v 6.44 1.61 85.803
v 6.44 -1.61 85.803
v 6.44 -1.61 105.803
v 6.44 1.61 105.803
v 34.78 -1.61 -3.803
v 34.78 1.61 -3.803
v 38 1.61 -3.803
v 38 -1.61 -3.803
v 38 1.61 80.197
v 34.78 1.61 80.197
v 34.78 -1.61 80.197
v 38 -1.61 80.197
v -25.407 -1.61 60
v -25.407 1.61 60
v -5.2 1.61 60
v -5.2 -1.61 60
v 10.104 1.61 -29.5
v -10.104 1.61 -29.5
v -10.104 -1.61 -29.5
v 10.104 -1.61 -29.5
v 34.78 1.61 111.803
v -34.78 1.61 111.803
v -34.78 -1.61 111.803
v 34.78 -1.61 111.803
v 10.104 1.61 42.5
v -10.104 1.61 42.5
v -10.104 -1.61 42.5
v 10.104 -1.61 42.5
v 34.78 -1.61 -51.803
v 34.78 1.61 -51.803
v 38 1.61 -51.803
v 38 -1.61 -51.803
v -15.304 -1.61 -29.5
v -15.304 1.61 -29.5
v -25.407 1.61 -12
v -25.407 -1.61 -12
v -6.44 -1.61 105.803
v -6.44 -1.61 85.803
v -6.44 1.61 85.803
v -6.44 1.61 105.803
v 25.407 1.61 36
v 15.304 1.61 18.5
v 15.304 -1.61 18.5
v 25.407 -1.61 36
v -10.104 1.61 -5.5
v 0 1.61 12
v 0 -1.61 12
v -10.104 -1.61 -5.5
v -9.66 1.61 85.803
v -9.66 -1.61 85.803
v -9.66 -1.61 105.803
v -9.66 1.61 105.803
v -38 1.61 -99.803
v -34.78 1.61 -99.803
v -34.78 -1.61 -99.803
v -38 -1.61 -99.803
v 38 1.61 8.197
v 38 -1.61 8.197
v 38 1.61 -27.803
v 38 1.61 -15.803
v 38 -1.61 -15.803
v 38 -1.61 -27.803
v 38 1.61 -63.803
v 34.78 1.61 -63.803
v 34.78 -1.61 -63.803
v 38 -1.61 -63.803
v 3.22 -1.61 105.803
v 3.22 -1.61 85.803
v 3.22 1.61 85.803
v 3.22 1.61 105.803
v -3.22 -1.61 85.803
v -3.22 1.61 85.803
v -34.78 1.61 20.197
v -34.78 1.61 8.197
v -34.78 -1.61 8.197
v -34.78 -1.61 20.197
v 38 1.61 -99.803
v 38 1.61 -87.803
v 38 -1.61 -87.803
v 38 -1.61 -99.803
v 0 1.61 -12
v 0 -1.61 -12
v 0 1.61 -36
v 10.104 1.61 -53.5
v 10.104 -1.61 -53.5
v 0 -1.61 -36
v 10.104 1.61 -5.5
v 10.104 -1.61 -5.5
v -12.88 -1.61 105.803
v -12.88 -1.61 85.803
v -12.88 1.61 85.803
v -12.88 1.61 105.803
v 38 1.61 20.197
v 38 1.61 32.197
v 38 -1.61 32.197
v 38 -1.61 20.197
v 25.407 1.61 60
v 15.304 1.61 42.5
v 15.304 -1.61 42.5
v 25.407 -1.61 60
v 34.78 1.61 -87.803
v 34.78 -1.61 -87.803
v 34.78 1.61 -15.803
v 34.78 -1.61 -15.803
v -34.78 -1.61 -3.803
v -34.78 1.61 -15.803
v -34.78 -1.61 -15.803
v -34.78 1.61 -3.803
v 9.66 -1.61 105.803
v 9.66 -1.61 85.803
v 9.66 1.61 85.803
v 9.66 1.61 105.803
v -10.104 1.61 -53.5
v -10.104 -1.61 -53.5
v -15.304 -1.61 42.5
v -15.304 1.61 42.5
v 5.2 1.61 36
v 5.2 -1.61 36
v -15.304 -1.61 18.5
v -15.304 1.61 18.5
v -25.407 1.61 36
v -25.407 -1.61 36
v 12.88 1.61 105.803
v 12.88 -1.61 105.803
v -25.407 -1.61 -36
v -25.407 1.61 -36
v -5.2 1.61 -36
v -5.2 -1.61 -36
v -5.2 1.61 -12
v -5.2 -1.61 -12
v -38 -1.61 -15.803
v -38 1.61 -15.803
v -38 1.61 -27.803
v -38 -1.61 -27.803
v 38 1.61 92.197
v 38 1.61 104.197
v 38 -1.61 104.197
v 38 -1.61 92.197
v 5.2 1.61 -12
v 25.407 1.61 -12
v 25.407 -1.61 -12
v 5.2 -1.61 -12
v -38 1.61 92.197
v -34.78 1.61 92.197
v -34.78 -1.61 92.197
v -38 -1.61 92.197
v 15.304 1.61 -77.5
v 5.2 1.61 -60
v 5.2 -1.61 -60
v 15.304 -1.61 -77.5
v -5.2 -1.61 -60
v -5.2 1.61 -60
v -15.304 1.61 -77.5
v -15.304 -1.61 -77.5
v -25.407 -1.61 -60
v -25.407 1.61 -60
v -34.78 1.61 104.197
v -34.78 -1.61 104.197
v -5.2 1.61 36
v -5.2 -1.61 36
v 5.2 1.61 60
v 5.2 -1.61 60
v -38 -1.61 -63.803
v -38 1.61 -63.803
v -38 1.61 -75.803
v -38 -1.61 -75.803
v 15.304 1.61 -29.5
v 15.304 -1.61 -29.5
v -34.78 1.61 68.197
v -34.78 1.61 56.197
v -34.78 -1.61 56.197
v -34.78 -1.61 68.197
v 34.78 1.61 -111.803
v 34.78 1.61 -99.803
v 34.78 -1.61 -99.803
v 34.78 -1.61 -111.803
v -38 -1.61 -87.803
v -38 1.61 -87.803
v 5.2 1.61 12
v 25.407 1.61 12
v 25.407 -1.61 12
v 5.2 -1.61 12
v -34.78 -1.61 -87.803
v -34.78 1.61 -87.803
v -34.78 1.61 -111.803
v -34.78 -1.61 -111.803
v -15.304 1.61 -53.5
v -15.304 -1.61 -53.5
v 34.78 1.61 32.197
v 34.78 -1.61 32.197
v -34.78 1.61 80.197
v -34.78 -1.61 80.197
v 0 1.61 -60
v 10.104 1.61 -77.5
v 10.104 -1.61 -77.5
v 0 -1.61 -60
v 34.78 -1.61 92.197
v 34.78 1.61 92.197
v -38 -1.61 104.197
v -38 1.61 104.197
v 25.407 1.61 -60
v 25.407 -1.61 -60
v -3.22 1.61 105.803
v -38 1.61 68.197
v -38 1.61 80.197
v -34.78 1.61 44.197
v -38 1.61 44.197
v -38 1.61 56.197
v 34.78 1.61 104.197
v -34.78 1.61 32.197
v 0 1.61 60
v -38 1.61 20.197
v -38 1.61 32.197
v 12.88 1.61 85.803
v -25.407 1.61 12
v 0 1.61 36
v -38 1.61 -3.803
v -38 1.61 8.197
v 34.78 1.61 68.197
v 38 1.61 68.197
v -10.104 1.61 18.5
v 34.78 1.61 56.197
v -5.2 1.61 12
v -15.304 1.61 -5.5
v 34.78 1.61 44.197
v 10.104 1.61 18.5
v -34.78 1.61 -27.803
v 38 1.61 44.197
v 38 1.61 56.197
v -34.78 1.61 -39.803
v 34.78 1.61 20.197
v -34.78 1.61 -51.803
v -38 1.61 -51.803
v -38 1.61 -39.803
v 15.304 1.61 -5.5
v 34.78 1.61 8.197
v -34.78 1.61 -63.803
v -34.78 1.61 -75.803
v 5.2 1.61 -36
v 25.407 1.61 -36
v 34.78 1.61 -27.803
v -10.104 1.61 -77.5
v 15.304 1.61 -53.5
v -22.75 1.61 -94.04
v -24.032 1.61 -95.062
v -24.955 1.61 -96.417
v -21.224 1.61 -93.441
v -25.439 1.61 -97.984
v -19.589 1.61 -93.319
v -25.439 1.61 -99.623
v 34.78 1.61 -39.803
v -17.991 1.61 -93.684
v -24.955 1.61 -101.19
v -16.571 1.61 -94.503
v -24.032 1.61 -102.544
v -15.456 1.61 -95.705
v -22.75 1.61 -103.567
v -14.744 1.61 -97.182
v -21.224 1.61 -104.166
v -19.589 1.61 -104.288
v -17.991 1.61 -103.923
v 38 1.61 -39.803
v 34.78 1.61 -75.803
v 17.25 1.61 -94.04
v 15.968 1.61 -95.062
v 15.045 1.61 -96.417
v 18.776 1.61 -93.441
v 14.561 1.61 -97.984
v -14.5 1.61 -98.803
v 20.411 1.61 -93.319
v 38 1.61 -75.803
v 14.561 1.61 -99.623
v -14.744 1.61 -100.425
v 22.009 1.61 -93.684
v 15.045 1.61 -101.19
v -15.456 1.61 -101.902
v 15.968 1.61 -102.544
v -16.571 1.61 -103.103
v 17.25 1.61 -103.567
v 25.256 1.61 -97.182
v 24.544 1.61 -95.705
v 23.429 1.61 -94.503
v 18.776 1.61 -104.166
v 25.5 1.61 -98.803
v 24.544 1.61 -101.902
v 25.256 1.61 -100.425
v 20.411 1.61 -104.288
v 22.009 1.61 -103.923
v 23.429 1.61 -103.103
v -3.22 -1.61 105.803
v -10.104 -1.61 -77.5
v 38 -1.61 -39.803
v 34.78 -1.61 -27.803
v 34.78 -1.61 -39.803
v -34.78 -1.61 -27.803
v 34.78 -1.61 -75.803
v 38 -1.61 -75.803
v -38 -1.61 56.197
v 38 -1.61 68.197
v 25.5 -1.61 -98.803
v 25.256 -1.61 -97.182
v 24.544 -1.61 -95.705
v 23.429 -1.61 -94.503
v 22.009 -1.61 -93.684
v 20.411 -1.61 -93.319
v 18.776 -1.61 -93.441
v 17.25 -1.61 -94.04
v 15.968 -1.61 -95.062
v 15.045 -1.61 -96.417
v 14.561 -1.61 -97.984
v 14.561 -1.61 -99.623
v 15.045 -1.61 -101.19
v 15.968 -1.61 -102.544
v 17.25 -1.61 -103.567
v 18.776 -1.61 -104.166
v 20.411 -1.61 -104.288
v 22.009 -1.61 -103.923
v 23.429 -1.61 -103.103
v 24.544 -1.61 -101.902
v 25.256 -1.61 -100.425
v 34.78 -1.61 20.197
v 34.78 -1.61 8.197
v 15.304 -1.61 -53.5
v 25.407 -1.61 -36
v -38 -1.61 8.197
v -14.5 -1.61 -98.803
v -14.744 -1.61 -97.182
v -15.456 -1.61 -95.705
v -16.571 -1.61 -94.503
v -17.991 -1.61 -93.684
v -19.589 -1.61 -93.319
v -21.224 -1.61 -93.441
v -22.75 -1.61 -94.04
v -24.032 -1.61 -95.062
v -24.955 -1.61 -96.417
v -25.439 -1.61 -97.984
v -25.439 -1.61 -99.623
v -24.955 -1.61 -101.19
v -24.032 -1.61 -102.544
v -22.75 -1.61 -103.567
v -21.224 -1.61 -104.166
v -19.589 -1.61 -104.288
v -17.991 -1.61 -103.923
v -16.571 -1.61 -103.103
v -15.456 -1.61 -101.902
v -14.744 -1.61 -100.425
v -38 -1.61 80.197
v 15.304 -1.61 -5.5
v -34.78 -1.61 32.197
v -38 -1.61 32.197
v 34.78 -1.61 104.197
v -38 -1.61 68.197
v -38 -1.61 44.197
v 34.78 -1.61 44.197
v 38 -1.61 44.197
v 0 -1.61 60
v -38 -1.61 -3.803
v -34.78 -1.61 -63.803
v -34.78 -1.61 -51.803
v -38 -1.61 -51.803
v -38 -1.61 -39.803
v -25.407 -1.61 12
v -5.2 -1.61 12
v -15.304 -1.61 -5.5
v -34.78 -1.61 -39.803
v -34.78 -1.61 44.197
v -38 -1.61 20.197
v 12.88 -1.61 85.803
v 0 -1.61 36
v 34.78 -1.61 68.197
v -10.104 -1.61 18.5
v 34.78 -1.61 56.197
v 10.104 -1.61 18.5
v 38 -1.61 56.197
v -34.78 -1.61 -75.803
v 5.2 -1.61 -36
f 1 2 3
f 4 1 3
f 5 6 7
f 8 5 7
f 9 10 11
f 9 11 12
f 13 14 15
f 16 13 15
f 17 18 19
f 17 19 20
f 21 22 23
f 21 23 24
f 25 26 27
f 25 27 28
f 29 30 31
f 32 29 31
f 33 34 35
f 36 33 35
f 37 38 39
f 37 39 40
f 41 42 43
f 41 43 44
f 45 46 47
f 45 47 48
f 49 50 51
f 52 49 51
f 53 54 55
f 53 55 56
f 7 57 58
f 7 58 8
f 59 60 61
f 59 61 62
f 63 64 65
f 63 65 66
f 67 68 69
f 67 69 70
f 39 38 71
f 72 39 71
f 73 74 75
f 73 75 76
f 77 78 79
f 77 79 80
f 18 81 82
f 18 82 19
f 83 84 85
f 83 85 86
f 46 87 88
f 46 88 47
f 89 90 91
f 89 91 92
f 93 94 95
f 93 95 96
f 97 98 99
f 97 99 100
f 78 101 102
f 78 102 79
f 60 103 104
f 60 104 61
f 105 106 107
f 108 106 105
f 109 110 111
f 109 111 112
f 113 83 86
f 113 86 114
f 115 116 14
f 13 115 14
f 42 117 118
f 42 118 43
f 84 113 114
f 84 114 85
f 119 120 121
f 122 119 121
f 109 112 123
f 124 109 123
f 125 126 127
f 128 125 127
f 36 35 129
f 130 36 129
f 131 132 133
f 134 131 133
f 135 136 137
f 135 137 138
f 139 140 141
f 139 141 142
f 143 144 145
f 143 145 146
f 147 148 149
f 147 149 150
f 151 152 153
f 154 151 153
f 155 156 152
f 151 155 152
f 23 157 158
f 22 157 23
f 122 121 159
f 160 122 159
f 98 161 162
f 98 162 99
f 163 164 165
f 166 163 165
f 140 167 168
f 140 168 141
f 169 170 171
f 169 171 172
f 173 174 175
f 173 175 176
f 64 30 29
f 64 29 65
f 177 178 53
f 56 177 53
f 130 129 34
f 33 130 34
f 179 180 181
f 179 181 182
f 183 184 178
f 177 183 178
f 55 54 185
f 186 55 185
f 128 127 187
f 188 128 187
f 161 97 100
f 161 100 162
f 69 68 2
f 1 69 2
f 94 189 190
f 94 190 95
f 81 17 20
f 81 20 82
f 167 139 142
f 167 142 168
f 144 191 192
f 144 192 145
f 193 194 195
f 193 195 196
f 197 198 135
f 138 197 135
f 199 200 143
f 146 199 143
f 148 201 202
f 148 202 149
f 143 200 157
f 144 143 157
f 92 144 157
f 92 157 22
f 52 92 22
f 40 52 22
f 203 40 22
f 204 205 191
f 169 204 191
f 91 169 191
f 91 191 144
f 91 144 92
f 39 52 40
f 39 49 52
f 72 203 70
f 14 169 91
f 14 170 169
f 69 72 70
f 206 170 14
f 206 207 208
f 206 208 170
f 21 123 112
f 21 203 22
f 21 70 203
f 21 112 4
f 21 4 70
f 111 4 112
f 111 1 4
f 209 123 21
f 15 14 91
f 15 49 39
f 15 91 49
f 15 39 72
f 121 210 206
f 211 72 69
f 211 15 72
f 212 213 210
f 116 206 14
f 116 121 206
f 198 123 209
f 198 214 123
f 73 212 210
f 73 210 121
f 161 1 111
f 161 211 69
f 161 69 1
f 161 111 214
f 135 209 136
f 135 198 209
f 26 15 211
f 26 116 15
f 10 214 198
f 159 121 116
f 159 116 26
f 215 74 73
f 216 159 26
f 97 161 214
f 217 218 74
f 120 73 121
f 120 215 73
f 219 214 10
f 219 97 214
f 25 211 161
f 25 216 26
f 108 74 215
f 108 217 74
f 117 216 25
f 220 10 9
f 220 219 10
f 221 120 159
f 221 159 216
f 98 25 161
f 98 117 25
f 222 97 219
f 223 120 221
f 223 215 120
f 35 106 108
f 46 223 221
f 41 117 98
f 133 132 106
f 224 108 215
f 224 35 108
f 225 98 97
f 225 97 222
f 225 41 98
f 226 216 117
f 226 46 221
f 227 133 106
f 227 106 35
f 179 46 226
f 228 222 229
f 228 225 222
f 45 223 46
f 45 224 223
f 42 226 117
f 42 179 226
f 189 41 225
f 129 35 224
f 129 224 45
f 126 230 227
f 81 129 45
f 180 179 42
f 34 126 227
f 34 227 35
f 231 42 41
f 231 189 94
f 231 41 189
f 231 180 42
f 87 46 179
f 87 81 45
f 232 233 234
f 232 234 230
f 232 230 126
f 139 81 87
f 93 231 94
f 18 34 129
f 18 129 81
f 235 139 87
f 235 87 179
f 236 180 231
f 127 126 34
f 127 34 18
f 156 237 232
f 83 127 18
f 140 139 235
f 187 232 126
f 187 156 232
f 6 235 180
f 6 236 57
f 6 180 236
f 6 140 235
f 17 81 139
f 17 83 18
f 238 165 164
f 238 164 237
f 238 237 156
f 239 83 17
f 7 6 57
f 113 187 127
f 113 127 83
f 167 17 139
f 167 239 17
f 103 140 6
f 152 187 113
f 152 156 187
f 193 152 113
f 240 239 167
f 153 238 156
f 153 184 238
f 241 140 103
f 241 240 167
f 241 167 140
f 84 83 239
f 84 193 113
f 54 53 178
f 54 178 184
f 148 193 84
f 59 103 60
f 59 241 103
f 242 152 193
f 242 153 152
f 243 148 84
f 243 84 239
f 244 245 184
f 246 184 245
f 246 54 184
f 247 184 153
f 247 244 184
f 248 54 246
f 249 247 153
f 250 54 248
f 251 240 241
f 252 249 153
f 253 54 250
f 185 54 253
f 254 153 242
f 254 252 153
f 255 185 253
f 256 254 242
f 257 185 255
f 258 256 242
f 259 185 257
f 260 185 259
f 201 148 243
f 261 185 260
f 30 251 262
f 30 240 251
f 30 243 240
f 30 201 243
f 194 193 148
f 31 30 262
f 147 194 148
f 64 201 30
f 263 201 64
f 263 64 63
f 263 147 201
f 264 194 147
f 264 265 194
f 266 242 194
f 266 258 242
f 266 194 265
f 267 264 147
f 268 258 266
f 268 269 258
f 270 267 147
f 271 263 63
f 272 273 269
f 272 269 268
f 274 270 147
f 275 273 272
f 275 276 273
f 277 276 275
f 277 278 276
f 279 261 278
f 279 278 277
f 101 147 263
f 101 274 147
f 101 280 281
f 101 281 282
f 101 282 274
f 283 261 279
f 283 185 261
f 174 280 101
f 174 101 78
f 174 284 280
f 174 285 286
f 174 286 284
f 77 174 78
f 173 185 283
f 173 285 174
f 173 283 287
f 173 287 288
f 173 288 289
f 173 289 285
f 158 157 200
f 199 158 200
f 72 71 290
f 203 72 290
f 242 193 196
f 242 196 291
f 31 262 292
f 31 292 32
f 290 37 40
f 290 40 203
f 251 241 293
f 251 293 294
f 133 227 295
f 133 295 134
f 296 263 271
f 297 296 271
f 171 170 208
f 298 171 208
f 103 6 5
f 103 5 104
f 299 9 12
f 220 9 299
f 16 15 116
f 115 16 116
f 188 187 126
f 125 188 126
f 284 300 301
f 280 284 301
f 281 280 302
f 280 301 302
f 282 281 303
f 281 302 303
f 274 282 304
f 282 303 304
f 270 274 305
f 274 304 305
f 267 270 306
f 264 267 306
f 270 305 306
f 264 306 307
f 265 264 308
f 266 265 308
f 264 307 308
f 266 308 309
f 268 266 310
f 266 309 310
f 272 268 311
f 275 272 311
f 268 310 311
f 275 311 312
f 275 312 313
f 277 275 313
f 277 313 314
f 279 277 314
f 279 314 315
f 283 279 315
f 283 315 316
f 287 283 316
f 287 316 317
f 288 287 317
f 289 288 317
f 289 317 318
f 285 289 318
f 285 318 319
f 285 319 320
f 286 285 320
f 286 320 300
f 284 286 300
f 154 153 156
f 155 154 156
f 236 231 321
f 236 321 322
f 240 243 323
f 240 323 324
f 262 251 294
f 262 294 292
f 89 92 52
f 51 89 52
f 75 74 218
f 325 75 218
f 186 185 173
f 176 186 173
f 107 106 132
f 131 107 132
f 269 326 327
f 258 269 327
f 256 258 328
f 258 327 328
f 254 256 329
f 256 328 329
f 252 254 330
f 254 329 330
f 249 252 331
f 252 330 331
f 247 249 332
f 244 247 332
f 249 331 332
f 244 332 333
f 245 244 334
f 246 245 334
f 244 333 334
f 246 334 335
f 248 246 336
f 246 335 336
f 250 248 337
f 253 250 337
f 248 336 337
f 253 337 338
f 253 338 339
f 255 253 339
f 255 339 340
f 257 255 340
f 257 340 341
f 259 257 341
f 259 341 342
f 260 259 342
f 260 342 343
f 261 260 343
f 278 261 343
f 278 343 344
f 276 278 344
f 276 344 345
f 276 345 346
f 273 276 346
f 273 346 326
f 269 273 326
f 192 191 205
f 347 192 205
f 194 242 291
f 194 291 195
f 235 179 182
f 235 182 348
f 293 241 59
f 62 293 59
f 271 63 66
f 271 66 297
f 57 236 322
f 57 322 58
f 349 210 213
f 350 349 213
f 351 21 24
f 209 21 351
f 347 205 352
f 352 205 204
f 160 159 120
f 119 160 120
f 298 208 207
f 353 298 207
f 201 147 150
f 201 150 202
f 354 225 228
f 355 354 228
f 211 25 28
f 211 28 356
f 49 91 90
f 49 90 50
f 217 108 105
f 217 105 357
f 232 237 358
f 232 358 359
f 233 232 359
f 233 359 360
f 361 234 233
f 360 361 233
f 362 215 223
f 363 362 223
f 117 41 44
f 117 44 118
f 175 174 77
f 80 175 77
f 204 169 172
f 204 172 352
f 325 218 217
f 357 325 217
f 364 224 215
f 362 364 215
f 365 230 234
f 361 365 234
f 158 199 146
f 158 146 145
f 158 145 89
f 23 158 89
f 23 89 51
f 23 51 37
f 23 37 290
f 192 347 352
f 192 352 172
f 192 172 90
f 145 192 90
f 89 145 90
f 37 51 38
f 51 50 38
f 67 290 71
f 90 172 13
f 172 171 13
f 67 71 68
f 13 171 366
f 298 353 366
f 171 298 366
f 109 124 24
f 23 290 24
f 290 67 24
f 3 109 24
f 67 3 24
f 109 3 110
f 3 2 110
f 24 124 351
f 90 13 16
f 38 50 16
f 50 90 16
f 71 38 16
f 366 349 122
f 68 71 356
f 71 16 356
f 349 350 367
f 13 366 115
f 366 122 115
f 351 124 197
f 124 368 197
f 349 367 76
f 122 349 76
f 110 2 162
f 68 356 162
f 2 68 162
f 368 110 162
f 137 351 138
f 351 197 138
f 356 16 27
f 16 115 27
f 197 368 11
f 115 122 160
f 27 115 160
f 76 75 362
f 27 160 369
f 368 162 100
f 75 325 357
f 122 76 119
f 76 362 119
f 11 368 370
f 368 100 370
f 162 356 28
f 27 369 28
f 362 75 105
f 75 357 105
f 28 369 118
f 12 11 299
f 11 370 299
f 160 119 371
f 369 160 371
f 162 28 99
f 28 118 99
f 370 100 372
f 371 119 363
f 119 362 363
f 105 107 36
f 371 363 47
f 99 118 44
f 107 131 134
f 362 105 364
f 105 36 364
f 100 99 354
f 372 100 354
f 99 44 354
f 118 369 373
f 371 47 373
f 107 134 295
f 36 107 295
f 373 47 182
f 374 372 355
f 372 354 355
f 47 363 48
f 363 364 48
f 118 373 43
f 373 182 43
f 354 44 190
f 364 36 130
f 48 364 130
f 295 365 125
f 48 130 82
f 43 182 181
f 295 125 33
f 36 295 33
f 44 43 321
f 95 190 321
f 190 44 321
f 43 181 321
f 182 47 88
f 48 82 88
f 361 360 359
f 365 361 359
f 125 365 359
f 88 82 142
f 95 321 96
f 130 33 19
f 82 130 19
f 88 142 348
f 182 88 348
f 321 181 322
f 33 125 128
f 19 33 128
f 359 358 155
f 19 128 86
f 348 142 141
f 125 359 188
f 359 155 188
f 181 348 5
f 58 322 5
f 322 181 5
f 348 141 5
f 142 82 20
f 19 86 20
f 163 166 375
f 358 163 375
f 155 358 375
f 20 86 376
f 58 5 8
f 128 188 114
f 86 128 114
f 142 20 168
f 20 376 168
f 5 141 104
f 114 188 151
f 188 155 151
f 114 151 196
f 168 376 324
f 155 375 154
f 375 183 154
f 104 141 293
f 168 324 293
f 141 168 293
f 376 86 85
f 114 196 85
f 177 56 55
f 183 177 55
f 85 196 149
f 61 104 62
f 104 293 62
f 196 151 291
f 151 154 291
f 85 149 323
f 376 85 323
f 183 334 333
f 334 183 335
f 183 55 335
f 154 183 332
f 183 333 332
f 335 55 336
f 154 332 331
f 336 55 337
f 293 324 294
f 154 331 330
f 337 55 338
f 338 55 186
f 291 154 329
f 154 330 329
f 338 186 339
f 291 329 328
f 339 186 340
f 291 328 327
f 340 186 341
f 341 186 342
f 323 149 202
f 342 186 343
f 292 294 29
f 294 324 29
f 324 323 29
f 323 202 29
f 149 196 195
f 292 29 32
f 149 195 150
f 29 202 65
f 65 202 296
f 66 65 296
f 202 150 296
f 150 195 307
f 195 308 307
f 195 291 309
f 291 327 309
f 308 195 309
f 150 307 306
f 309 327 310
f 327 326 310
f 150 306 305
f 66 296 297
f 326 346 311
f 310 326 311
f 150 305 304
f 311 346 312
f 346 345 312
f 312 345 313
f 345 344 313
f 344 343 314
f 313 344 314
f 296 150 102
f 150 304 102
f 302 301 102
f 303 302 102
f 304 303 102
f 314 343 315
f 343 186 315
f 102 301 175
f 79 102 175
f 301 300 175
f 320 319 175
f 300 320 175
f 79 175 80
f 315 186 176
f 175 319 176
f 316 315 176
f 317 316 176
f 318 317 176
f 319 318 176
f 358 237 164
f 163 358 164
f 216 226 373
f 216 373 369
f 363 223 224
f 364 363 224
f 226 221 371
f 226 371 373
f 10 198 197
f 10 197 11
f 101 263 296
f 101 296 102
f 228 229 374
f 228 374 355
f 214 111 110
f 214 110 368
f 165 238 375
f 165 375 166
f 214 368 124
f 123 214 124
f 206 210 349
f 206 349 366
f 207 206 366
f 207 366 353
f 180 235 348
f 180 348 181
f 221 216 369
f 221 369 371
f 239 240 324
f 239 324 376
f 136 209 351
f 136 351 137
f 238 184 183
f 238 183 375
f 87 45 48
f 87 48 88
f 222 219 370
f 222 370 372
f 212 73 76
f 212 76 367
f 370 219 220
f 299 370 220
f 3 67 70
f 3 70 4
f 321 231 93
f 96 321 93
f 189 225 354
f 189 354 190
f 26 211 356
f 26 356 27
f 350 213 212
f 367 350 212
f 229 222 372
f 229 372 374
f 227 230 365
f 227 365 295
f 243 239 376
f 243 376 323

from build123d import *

# Parameters (mm, degrees)
SKETCH1_W               = 76
SKETCH1_H               = 223.60679775
BOSS_EXTRUDE1_DEPTH     = 1.61
SKETCH2_W               = 3.22
SKETCH2_H               = 12
CUT_EXTRUDE1_DEPTH      = 3.22
LPATTERN1_COUNT         = 10
LPATTERN1_PITCH         = 24
MIRROR1_COPY_1_SKETCH_W = 3.22
MIRROR1_COPY_1_SKETCH_H = 12
MIRROR1_COPY_1_DEPTH    = 3.22
MIRROR1_COPY_2_SKETCH_W = 3.22
MIRROR1_COPY_2_SKETCH_H = 12
MIRROR1_COPY_2_DEPTH    = 3.22
MIRROR1_COPY_3_SKETCH_W = 3.22
MIRROR1_COPY_3_SKETCH_H = 12
MIRROR1_COPY_3_DEPTH    = 3.22
MIRROR1_COPY_4_SKETCH_W = 3.22
MIRROR1_COPY_4_SKETCH_H = 12
MIRROR1_COPY_4_DEPTH    = 3.22
MIRROR1_COPY_5_SKETCH_W = 3.22
MIRROR1_COPY_5_SKETCH_H = 12
MIRROR1_COPY_5_DEPTH    = 3.22
MIRROR1_COPY_6_SKETCH_W = 3.22
MIRROR1_COPY_6_SKETCH_H = 12
MIRROR1_COPY_6_DEPTH    = 3.22
MIRROR1_COPY_7_SKETCH_W = 3.22
MIRROR1_COPY_7_SKETCH_H = 12
MIRROR1_COPY_7_DEPTH    = 3.22
MIRROR1_COPY_8_SKETCH_W = 3.22
MIRROR1_COPY_8_SKETCH_H = 12
MIRROR1_COPY_8_DEPTH    = 3.22
MIRROR1_COPY_9_SKETCH_W = 3.22
MIRROR1_COPY_9_SKETCH_H = 12
MIRROR1_COPY_9_DEPTH    = 3.22
SKETCH4_R               = 5.5
CUT_EXTRUDE2_DEPTH      = 10
CUT_EXTRUDE5_REACH      = 5.22
SKETCH7_W               = 3.22
SKETCH7_H               = 20
CUT_EXTRUDE7_DEPTH      = 3.22
LPATTERN2_COUNT         = 6
LPATTERN2_PITCH         = 24


with BuildPart() as part:
    # Sketch1 → Boss-Extrude1 (new body, symmetric)
    with BuildSketch(Plane(origin=(0, 0, 0), x_dir=(1, 0, 0), z_dir=(0, 1, 0))):
        Rectangle(SKETCH1_W, SKETCH1_H)
    extrude(amount=BOSS_EXTRUDE1_DEPTH, both=True)

    # Sketch2 → Cut-Extrude1 (cut)
    with BuildSketch(Plane(origin=(0, 1.61, 0), x_dir=(1, 0, 0), z_dir=(0, 1, 0))):
        with Locations((36.39, 105.803398875)):
            Rectangle(SKETCH2_W, SKETCH2_H)
    cut_extrude1 = extrude(amount=-CUT_EXTRUDE1_DEPTH, mode=Mode.SUBTRACT)

    # LPattern1: Cut-Extrude1 ×10
    with Locations(*[(0, 0, i * LPATTERN1_PITCH) for i in range(1, LPATTERN1_COUNT)]):
        add(cut_extrude1, mode=Mode.SUBTRACT)

    # Mirror1: Cut-Extrude1 across plane
    add(cut_extrude1.mirror(Plane(origin=(0, 0, 0), x_dir=(0, 0, 1), z_dir=(1, 0, 0))), mode=Mode.SUBTRACT)

    # Mirror1 copy 1 sketch → Mirror1 copy 1 (cut)
    with BuildSketch(Plane(origin=(0, 1.61, 24), x_dir=(-1, 0, 0), z_dir=(0, 1, 0))):
        with Locations((36.39, -105.803398875)):
            Rectangle(MIRROR1_COPY_1_SKETCH_W, MIRROR1_COPY_1_SKETCH_H)
    extrude(amount=-MIRROR1_COPY_1_DEPTH, mode=Mode.SUBTRACT)

    # Mirror1 copy 2 sketch → Mirror1 copy 2 (cut)
    with BuildSketch(Plane(origin=(0, 1.61, 48), x_dir=(-1, 0, 0), z_dir=(0, 1, 0))):
        with Locations((36.39, -105.803398875)):
            Rectangle(MIRROR1_COPY_2_SKETCH_W, MIRROR1_COPY_2_SKETCH_H)
    extrude(amount=-MIRROR1_COPY_2_DEPTH, mode=Mode.SUBTRACT)

    # Mirror1 copy 3 sketch → Mirror1 copy 3 (cut)
    with BuildSketch(Plane(origin=(0, 1.61, 72), x_dir=(-1, 0, 0), z_dir=(0, 1, 0))):
        with Locations((36.39, -105.803398875)):
            Rectangle(MIRROR1_COPY_3_SKETCH_W, MIRROR1_COPY_3_SKETCH_H)
    extrude(amount=-MIRROR1_COPY_3_DEPTH, mode=Mode.SUBTRACT)

    # Mirror1 copy 4 sketch → Mirror1 copy 4 (cut)
    with BuildSketch(Plane(origin=(0, 1.61, 96), x_dir=(-1, 0, 0), z_dir=(0, 1, 0))):
        with Locations((36.39, -105.803398875)):
            Rectangle(MIRROR1_COPY_4_SKETCH_W, MIRROR1_COPY_4_SKETCH_H)
    extrude(amount=-MIRROR1_COPY_4_DEPTH, mode=Mode.SUBTRACT)

    # Mirror1 copy 5 sketch → Mirror1 copy 5 (cut)
    with BuildSketch(Plane(origin=(0, 1.61, 120), x_dir=(-1, 0, 0), z_dir=(0, 1, 0))):
        with Locations((36.39, -105.803398875)):
            Rectangle(MIRROR1_COPY_5_SKETCH_W, MIRROR1_COPY_5_SKETCH_H)
    extrude(amount=-MIRROR1_COPY_5_DEPTH, mode=Mode.SUBTRACT)

    # Mirror1 copy 6 sketch → Mirror1 copy 6 (cut)
    with BuildSketch(Plane(origin=(0, 1.61, 144), x_dir=(-1, 0, 0), z_dir=(0, 1, 0))):
        with Locations((36.39, -105.803398875)):
            Rectangle(MIRROR1_COPY_6_SKETCH_W, MIRROR1_COPY_6_SKETCH_H)
    extrude(amount=-MIRROR1_COPY_6_DEPTH, mode=Mode.SUBTRACT)

    # Mirror1 copy 7 sketch → Mirror1 copy 7 (cut)
    with BuildSketch(Plane(origin=(0, 1.61, 168), x_dir=(-1, 0, 0), z_dir=(0, 1, 0))):
        with Locations((36.39, -105.803398875)):
            Rectangle(MIRROR1_COPY_7_SKETCH_W, MIRROR1_COPY_7_SKETCH_H)
    extrude(amount=-MIRROR1_COPY_7_DEPTH, mode=Mode.SUBTRACT)

    # Mirror1 copy 8 sketch → Mirror1 copy 8 (cut)
    with BuildSketch(Plane(origin=(0, 1.61, 192), x_dir=(-1, 0, 0), z_dir=(0, 1, 0))):
        with Locations((36.39, -105.803398875)):
            Rectangle(MIRROR1_COPY_8_SKETCH_W, MIRROR1_COPY_8_SKETCH_H)
    extrude(amount=-MIRROR1_COPY_8_DEPTH, mode=Mode.SUBTRACT)

    # Mirror1 copy 9 sketch → Mirror1 copy 9 (cut)
    with BuildSketch(Plane(origin=(0, 1.61, 216), x_dir=(-1, 0, 0), z_dir=(0, 1, 0))):
        with Locations((36.39, -105.803398875)):
            Rectangle(MIRROR1_COPY_9_SKETCH_W, MIRROR1_COPY_9_SKETCH_H)
    extrude(amount=-MIRROR1_COPY_9_DEPTH, mode=Mode.SUBTRACT)

    # Sketch4 → Cut-Extrude2 (cut)
    with BuildSketch(Plane.XZ.offset(1.61)):
        with Locations((-20, -98.803398875)):
            Circle(SKETCH4_R)
        with Locations((20, -98.803398875)):
            Circle(SKETCH4_R)
    extrude(amount=-CUT_EXTRUDE2_DEPTH, mode=Mode.SUBTRACT)

    # Sketch7 → Cut-Extrude5 (cut, up to next)
    with BuildSketch(Plane.XZ.offset(1.61), mode=Mode.PRIVATE) as cut_extrude5_sk1:
        with Locations((-11.27, 95.803398875)):
            Rectangle(SKETCH7_W, SKETCH7_H)
    cut_extrude5_tool1 = extrude(cut_extrude5_sk1.sketch, amount=-CUT_EXTRUDE5_REACH, mode=Mode.PRIVATE) & part.part
    add(cut_extrude5_tool1.solids().sort_by_distance((-11.27, -1.61, 95.803399))[0], mode=Mode.SUBTRACT)
    # Sketch7 → Cut-Extrude5 (cut, up to next)
    with BuildSketch(Plane.XZ.offset(1.61), mode=Mode.PRIVATE) as cut_extrude5_sk2:
        with Locations((-4.83, 95.803398875)):
            Rectangle(SKETCH7_W, SKETCH7_H)
    cut_extrude5_tool2 = extrude(cut_extrude5_sk2.sketch, amount=-CUT_EXTRUDE5_REACH, mode=Mode.PRIVATE) & part.part
    add(cut_extrude5_tool2.solids().sort_by_distance((-4.83, -1.61, 95.803399))[0], mode=Mode.SUBTRACT)
    # Sketch7 → Cut-Extrude5 (cut, up to next)
    with BuildSketch(Plane.XZ.offset(1.61), mode=Mode.PRIVATE) as cut_extrude5_sk3:
        with Locations((4.83, 95.803398875)):
            Rectangle(SKETCH7_W, SKETCH7_H)
    cut_extrude5_tool3 = extrude(cut_extrude5_sk3.sketch, amount=-CUT_EXTRUDE5_REACH, mode=Mode.PRIVATE) & part.part
    add(cut_extrude5_tool3.solids().sort_by_distance((4.83, -1.61, 95.803399))[0], mode=Mode.SUBTRACT)
    # Sketch7 → Cut-Extrude5 (cut, up to next)
    with BuildSketch(Plane.XZ.offset(1.61), mode=Mode.PRIVATE) as cut_extrude5_sk4:
        with Locations((11.27, 95.803398875)):
            Rectangle(SKETCH7_W, SKETCH7_H)
    cut_extrude5_tool4 = extrude(cut_extrude5_sk4.sketch, amount=-CUT_EXTRUDE5_REACH, mode=Mode.PRIVATE) & part.part
    add(cut_extrude5_tool4.solids().sort_by_distance((11.27, -1.61, 95.803399))[0], mode=Mode.SUBTRACT)

    # Sketch8 → Cut-Extrude7 (cut)
    with BuildSketch(Plane(origin=(0, 1.61, 0), x_dir=(1, 0, 0), z_dir=(0, 1, 0))):
        Polygon((-5.2, 60), (-15.303629711, 77.5), (-25.407259422, 60), align=None)
        Polygon((-10.103629711, 77.5), (10.103629711, 77.5), (0, 60), align=None)
        Polygon((15.303629711, 77.5), (25.407259422, 60), (5.2, 60), align=None)
    cut_extrude7 = extrude(amount=-CUT_EXTRUDE7_DEPTH, mode=Mode.SUBTRACT)

    # LPattern2: Cut-Extrude7 ×6
    with Locations(*[(0, 0, i * LPATTERN2_PITCH) for i in range(1, LPATTERN2_COUNT)]):
        add(cut_extrude7, mode=Mode.SUBTRACT)


solid = part.part
